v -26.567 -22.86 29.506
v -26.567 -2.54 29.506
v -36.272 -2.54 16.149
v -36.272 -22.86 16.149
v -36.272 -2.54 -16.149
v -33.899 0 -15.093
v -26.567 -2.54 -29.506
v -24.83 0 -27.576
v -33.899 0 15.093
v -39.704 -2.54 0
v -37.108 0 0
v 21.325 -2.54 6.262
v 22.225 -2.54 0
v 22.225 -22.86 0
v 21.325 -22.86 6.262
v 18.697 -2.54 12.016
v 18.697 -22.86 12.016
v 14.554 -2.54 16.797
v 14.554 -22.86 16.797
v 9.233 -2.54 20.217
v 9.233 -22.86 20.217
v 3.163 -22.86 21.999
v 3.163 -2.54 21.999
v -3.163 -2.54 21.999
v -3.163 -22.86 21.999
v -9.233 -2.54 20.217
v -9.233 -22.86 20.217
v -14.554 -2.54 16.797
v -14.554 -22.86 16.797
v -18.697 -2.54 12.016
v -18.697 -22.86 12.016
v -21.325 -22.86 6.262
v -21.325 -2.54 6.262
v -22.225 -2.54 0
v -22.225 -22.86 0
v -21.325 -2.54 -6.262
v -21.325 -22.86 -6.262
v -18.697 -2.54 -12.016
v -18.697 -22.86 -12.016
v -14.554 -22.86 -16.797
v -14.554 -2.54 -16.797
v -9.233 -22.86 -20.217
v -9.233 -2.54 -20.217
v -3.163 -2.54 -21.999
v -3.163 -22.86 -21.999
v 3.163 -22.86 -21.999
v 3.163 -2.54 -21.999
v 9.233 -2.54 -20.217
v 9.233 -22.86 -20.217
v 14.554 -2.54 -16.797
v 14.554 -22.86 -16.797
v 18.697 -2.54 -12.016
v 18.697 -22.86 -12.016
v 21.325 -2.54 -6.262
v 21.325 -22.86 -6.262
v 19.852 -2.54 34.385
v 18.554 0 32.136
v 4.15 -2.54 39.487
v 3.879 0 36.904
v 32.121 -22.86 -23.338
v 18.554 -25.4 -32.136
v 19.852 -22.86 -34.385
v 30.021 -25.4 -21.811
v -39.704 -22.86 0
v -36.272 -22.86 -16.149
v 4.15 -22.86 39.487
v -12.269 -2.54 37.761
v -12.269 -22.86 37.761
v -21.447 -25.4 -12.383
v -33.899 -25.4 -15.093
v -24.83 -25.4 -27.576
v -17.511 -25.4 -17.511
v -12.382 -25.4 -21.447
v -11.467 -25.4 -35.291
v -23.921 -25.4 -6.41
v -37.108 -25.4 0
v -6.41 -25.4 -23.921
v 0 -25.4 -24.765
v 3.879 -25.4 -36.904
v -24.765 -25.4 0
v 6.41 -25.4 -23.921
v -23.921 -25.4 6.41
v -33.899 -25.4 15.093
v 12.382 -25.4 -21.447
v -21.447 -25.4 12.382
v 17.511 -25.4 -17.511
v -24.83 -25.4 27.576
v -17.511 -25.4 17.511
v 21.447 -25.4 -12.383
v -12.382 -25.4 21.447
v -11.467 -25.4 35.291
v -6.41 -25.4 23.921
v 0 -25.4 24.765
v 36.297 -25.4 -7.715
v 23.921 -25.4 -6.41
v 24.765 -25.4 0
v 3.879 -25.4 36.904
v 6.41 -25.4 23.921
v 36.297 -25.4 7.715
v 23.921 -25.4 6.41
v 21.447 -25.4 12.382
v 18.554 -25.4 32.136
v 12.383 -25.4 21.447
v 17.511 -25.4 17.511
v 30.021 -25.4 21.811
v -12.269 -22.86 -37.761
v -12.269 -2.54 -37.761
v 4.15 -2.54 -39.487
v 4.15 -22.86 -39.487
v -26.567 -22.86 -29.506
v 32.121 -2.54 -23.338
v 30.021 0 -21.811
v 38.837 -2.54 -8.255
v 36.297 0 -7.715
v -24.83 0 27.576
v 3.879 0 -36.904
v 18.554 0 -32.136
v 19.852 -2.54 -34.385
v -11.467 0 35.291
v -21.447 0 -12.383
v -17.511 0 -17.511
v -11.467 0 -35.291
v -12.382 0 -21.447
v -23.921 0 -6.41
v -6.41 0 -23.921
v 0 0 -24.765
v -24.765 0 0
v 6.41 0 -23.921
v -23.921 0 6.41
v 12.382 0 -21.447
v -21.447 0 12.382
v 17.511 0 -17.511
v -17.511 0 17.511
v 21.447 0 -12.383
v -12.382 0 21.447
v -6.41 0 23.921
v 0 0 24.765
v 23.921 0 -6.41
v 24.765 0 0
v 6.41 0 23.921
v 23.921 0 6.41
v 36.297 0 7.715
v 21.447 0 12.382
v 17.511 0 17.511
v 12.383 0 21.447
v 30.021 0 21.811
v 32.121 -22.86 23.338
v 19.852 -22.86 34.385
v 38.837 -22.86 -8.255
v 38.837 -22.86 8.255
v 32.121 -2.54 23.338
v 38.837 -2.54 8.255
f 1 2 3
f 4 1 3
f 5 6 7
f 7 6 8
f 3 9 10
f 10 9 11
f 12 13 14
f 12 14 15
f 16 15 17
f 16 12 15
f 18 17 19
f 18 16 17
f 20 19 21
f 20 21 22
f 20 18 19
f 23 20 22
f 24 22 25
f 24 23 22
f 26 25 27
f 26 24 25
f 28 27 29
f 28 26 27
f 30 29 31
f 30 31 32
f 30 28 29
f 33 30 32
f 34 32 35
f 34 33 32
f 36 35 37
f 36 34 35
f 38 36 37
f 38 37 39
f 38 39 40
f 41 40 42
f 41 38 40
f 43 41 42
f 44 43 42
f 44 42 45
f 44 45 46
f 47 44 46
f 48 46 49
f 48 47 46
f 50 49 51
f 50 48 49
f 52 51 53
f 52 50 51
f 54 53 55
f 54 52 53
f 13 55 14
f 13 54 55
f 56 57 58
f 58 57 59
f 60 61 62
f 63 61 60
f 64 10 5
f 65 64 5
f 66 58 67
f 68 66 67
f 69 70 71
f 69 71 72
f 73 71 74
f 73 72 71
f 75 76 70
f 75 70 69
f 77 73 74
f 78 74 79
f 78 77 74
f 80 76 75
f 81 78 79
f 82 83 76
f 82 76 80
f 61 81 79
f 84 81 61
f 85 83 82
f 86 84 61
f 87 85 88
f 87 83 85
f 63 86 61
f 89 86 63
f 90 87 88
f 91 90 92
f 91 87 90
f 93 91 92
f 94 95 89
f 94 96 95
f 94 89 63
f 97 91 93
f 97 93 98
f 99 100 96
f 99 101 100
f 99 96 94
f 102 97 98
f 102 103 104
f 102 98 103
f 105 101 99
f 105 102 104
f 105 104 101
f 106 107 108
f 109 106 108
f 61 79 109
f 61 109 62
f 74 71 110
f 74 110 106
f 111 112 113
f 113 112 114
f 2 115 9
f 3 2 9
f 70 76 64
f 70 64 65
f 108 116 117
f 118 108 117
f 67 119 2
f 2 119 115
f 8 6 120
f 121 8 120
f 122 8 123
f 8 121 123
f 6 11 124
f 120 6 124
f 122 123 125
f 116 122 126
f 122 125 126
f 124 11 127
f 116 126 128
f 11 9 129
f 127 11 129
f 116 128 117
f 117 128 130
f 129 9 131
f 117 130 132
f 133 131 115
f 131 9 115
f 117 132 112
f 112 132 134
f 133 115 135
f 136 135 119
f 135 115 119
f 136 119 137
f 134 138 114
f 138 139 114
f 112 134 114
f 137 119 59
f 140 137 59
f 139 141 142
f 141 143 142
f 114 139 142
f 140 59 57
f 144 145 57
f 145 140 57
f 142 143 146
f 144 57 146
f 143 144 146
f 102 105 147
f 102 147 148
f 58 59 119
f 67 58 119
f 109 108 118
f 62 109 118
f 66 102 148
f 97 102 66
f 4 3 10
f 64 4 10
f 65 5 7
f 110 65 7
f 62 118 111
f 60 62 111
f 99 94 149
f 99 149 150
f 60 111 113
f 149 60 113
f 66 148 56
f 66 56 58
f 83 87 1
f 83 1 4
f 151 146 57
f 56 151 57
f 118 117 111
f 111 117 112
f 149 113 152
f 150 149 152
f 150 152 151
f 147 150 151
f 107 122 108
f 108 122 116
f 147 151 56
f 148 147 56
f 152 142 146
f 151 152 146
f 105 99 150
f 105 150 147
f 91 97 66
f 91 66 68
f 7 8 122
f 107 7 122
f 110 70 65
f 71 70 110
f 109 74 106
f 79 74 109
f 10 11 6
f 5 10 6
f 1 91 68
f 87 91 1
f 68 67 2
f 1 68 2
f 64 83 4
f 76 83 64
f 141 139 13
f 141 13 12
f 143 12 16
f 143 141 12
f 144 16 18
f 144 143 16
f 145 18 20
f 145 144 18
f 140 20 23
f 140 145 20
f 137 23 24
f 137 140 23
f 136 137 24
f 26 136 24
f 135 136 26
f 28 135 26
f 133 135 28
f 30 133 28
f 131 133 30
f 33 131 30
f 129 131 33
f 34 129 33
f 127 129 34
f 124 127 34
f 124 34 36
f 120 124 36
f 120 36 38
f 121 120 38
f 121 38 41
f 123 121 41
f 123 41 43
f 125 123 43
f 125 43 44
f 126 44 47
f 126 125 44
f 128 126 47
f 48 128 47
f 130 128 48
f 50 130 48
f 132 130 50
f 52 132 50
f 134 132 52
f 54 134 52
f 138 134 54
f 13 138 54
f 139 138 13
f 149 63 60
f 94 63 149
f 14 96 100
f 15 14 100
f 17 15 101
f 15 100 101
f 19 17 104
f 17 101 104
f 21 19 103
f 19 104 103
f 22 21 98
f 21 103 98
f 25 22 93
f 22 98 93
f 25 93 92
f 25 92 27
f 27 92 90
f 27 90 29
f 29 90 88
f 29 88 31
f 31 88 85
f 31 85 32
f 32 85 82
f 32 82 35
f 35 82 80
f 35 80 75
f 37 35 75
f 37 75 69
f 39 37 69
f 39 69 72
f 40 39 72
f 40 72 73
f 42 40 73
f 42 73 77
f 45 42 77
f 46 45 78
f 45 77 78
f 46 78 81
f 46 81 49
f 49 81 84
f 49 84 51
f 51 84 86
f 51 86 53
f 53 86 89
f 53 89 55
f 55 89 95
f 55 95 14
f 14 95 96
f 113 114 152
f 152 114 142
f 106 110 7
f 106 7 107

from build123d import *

# Parameters (mm, degrees)
F0_R     = 22.225
F1_DEPTH = 25.4
F2_SIZE  = 2.54


with BuildPart() as f1:
    # F0 (on Front) → F1 (new body)
    with BuildSketch(Plane.XZ):
        Polygon((-36.271735, 16.149217), (-39.704357, 0), (-36.271735, -16.149217), (-26.5674, -29.506087), (-12.269321, -37.761087), (4.150235, -39.486852), (19.852179, -34.384982), (32.1215, -23.337636), (38.836722, -8.255), (38.836722, 8.255), (32.1215, 23.337636), (19.852179, 34.384982), (4.150235, 39.486852), (-12.269321, 37.761087), (-26.5674, 29.506087), align=None)
        Circle(F0_R, mode=Mode.SUBTRACT)
    extrude(amount=F1_DEPTH)

    # F2
    f2_edges = [f1.edges().sort_by_distance(p)[0] for p in [
        (35.479111, -25.4, -15.796318),
        (38.836722, -25.4, 0),
        (35.479111, -25.4, 15.796318),
        (25.986839, -25.4, 28.861309),
        (12.001207, -25.4, 36.935917),
        (-4.059543, -25.4, 38.62397),
        (-19.418361, -25.4, 33.633587),
        (-31.419568, -25.4, 22.827652),
        (-37.988046, -25.4, 8.074608),
        (-37.988046, -25.4, -8.074608),
        (-31.419568, -25.4, -22.827652),
        (-19.418361, -25.4, -33.633587),
        (-4.059543, -25.4, -38.62397),
        (12.001207, -25.4, -36.935917),
        (25.986839, -25.4, -28.861309),
        (-22.225, -25.4, 0),
        (35.479111, 0, -15.796318),
        (38.836722, 0, 0),
        (35.479111, 0, 15.796318),
        (25.986839, 0, 28.861309),
        (12.001207, 0, 36.935917),
        (-4.059543, 0, 38.62397),
        (-19.418361, 0, 33.633587),
        (-31.419568, 0, 22.827652),
        (-37.988046, 0, 8.074608),
        (-37.988046, 0, -8.074608),
        (-31.419568, 0, -22.827652),
        (-19.418361, 0, -33.633587),
        (-4.059543, 0, -38.62397),
        (12.001207, 0, -36.935917),
        (25.986839, 0, -28.861309),
        (-22.225, 0, 0),
    ]]
    chamfer(f2_edges, length=F2_SIZE)


solid = f1.part
